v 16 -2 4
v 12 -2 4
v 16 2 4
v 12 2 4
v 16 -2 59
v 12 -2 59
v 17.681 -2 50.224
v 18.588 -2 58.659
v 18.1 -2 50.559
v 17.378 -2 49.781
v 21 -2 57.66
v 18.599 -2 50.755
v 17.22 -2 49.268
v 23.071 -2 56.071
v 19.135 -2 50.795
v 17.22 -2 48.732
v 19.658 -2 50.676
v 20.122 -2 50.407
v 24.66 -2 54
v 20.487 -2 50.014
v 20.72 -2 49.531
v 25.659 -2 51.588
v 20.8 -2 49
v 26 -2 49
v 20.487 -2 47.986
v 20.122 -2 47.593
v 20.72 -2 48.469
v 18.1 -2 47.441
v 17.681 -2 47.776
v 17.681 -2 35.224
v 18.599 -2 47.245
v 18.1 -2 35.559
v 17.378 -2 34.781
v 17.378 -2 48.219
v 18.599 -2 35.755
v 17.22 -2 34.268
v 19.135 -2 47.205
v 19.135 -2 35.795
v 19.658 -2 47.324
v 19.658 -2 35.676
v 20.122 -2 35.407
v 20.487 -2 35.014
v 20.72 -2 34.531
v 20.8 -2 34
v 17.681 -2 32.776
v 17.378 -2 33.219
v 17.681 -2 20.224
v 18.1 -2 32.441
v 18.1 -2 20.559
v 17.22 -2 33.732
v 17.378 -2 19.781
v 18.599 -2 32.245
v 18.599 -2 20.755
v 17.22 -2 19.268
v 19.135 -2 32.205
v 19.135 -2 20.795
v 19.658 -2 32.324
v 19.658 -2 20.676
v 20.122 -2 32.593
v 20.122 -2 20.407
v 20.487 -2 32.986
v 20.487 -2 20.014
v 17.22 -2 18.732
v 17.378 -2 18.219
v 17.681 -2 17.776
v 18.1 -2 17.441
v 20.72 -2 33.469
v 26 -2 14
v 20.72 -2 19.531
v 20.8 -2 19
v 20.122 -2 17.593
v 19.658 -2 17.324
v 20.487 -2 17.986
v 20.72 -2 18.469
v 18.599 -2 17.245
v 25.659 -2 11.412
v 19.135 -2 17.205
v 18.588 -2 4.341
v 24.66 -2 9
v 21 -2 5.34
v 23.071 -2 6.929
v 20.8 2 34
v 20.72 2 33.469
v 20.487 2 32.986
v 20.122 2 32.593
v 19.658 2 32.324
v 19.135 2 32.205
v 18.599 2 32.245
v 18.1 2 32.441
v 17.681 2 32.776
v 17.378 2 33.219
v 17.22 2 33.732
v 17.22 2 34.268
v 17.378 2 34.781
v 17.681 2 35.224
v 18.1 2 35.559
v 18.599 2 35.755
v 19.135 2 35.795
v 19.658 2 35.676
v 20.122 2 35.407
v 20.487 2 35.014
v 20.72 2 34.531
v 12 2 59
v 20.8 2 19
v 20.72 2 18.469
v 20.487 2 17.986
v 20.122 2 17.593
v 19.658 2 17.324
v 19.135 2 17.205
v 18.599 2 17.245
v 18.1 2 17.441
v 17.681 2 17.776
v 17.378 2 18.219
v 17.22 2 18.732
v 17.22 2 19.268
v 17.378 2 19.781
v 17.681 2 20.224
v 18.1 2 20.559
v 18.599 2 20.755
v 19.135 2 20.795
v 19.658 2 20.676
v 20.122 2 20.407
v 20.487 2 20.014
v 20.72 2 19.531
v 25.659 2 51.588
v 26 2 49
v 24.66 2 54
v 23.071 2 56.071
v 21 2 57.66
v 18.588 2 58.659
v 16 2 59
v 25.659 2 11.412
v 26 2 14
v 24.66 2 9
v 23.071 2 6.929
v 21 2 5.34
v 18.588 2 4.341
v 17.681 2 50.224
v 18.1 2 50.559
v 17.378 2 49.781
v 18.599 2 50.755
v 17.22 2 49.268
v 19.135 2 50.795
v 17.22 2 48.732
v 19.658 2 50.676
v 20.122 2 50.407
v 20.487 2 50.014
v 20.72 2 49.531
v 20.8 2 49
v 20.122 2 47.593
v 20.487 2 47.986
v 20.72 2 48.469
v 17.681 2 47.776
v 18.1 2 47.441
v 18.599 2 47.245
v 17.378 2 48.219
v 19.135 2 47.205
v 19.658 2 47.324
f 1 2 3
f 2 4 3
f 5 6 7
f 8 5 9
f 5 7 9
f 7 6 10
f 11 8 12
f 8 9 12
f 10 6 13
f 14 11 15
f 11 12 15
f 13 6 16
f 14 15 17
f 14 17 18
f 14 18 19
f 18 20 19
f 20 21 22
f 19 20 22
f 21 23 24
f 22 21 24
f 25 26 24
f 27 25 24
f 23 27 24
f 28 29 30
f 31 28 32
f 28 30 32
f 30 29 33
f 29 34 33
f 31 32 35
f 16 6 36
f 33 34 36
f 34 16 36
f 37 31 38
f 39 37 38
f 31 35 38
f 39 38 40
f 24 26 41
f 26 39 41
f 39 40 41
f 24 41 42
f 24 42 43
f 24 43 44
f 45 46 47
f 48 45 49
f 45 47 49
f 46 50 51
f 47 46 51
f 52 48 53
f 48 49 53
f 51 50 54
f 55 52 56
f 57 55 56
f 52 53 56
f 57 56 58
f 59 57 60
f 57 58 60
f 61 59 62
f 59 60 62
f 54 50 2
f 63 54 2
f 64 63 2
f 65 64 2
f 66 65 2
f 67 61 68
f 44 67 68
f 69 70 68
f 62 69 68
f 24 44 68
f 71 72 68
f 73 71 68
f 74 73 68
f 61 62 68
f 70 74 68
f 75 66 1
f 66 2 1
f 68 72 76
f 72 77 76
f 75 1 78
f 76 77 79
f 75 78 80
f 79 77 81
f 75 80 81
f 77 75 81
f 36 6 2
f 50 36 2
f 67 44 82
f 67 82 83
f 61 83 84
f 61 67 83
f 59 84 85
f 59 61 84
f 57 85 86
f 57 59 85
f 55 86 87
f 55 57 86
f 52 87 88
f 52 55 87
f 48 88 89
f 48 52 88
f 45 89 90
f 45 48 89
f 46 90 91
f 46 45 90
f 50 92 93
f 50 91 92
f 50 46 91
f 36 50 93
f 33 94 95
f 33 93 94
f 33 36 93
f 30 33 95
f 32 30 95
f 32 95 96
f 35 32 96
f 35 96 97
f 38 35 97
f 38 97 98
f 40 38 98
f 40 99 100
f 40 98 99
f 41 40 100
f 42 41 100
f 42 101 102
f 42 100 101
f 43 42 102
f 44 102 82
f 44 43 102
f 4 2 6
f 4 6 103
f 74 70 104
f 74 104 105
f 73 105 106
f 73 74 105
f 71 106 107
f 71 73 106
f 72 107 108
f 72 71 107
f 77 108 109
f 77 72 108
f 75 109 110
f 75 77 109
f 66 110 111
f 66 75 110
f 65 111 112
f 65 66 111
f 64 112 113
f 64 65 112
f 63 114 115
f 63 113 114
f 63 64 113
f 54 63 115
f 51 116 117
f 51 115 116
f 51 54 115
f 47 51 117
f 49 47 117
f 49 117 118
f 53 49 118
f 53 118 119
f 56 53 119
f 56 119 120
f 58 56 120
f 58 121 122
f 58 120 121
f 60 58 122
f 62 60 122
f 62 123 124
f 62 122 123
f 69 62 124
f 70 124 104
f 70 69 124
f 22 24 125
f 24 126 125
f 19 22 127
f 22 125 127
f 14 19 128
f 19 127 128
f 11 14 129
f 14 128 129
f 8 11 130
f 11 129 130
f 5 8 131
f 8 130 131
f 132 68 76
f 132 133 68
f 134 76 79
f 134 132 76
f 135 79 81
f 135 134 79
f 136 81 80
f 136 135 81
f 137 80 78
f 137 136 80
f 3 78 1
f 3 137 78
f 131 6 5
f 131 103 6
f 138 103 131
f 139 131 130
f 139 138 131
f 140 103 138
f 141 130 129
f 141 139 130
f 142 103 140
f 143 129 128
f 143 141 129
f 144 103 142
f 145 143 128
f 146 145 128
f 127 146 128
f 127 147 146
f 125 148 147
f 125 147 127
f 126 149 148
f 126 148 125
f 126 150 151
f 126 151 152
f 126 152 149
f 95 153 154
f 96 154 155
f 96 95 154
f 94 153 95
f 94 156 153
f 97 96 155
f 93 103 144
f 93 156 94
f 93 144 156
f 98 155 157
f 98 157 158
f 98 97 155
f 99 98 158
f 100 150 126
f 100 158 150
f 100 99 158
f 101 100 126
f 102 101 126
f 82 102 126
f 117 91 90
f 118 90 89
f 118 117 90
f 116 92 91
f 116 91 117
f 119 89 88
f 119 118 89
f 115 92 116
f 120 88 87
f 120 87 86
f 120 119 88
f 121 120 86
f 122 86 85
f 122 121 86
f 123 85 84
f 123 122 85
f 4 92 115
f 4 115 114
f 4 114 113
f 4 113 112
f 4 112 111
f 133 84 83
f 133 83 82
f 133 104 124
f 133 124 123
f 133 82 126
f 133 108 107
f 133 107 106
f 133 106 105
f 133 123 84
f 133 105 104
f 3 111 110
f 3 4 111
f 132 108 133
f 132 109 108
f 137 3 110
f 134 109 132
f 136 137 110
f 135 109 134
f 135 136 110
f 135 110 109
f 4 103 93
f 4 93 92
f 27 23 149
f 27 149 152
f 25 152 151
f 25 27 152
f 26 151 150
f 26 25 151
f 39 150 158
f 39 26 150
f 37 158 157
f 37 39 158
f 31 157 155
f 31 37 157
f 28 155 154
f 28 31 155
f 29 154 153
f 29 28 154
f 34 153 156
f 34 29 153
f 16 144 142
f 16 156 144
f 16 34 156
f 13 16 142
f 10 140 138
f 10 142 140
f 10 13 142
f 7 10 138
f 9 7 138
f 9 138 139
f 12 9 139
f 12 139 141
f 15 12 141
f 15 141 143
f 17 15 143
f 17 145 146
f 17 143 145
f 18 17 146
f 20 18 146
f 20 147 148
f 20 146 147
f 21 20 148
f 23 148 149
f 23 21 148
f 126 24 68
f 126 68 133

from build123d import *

# Parameters (mm, degrees)
CYLINDER023_R     = 1.8
CYLINDER023_DEPTH = 40
ARRAY002_Z_COUNT  = 3
ARRAY002_Z_PITCH  = 15
BOX_W             = 14
BOX_H             = 4
BOX_DEPTH         = 55
FILLET003_R       = 10


with BuildPart() as attachment_hole_array:
    # Cylinder023 → Cylinder023 (new body)
    with BuildSketch(Plane(origin=(19, -20, 0), x_dir=(1, 0, 0), z_dir=(0, 1, 0))):
        Circle(CYLINDER023_R)
    extrude(amount=CYLINDER023_DEPTH)

    # Array002 Z: attachment hole array ×3


with BuildPart() as attachment_hole_array_1:
    add(attachment_hole_array.part)
    with Locations(*[(0, 0, i * ARRAY002_Z_PITCH) for i in range(1, ARRAY002_Z_COUNT)]):
        add(attachment_hole_array.part)


with BuildPart() as attachment_hole_array_2:
    # Array002 placement: moved
    add(attachment_hole_array_1.part.moved(Location((0, 0, 15))))


with BuildPart() as attachment_cut:
    # Box → Box (new body)
    with BuildSketch(Plane(origin=(12, -2, 0), x_dir=(1, 0, 0), z_dir=(0, 0, 1))):
        with Locations((7, 2)):
            Rectangle(BOX_W, BOX_H)
    extrude(amount=BOX_DEPTH)

    # Fillet003
    fillet003_edges = [attachment_cut.edges().sort_by_distance(p)[0] for p in [
        (26, 0, 55),
        (26, 0, 0),
    ]]
    fillet(fillet003_edges, radius=FILLET003_R)

    # Cut004: cut attachment hole array
    add(attachment_hole_array_2.part, mode=Mode.SUBTRACT)


with BuildPart() as attachment_cut_1:
    # Cut004 placement: moved
    add(attachment_cut.part.moved(Location((0, 0, 4))))


solid = attachment_cut_1.part
